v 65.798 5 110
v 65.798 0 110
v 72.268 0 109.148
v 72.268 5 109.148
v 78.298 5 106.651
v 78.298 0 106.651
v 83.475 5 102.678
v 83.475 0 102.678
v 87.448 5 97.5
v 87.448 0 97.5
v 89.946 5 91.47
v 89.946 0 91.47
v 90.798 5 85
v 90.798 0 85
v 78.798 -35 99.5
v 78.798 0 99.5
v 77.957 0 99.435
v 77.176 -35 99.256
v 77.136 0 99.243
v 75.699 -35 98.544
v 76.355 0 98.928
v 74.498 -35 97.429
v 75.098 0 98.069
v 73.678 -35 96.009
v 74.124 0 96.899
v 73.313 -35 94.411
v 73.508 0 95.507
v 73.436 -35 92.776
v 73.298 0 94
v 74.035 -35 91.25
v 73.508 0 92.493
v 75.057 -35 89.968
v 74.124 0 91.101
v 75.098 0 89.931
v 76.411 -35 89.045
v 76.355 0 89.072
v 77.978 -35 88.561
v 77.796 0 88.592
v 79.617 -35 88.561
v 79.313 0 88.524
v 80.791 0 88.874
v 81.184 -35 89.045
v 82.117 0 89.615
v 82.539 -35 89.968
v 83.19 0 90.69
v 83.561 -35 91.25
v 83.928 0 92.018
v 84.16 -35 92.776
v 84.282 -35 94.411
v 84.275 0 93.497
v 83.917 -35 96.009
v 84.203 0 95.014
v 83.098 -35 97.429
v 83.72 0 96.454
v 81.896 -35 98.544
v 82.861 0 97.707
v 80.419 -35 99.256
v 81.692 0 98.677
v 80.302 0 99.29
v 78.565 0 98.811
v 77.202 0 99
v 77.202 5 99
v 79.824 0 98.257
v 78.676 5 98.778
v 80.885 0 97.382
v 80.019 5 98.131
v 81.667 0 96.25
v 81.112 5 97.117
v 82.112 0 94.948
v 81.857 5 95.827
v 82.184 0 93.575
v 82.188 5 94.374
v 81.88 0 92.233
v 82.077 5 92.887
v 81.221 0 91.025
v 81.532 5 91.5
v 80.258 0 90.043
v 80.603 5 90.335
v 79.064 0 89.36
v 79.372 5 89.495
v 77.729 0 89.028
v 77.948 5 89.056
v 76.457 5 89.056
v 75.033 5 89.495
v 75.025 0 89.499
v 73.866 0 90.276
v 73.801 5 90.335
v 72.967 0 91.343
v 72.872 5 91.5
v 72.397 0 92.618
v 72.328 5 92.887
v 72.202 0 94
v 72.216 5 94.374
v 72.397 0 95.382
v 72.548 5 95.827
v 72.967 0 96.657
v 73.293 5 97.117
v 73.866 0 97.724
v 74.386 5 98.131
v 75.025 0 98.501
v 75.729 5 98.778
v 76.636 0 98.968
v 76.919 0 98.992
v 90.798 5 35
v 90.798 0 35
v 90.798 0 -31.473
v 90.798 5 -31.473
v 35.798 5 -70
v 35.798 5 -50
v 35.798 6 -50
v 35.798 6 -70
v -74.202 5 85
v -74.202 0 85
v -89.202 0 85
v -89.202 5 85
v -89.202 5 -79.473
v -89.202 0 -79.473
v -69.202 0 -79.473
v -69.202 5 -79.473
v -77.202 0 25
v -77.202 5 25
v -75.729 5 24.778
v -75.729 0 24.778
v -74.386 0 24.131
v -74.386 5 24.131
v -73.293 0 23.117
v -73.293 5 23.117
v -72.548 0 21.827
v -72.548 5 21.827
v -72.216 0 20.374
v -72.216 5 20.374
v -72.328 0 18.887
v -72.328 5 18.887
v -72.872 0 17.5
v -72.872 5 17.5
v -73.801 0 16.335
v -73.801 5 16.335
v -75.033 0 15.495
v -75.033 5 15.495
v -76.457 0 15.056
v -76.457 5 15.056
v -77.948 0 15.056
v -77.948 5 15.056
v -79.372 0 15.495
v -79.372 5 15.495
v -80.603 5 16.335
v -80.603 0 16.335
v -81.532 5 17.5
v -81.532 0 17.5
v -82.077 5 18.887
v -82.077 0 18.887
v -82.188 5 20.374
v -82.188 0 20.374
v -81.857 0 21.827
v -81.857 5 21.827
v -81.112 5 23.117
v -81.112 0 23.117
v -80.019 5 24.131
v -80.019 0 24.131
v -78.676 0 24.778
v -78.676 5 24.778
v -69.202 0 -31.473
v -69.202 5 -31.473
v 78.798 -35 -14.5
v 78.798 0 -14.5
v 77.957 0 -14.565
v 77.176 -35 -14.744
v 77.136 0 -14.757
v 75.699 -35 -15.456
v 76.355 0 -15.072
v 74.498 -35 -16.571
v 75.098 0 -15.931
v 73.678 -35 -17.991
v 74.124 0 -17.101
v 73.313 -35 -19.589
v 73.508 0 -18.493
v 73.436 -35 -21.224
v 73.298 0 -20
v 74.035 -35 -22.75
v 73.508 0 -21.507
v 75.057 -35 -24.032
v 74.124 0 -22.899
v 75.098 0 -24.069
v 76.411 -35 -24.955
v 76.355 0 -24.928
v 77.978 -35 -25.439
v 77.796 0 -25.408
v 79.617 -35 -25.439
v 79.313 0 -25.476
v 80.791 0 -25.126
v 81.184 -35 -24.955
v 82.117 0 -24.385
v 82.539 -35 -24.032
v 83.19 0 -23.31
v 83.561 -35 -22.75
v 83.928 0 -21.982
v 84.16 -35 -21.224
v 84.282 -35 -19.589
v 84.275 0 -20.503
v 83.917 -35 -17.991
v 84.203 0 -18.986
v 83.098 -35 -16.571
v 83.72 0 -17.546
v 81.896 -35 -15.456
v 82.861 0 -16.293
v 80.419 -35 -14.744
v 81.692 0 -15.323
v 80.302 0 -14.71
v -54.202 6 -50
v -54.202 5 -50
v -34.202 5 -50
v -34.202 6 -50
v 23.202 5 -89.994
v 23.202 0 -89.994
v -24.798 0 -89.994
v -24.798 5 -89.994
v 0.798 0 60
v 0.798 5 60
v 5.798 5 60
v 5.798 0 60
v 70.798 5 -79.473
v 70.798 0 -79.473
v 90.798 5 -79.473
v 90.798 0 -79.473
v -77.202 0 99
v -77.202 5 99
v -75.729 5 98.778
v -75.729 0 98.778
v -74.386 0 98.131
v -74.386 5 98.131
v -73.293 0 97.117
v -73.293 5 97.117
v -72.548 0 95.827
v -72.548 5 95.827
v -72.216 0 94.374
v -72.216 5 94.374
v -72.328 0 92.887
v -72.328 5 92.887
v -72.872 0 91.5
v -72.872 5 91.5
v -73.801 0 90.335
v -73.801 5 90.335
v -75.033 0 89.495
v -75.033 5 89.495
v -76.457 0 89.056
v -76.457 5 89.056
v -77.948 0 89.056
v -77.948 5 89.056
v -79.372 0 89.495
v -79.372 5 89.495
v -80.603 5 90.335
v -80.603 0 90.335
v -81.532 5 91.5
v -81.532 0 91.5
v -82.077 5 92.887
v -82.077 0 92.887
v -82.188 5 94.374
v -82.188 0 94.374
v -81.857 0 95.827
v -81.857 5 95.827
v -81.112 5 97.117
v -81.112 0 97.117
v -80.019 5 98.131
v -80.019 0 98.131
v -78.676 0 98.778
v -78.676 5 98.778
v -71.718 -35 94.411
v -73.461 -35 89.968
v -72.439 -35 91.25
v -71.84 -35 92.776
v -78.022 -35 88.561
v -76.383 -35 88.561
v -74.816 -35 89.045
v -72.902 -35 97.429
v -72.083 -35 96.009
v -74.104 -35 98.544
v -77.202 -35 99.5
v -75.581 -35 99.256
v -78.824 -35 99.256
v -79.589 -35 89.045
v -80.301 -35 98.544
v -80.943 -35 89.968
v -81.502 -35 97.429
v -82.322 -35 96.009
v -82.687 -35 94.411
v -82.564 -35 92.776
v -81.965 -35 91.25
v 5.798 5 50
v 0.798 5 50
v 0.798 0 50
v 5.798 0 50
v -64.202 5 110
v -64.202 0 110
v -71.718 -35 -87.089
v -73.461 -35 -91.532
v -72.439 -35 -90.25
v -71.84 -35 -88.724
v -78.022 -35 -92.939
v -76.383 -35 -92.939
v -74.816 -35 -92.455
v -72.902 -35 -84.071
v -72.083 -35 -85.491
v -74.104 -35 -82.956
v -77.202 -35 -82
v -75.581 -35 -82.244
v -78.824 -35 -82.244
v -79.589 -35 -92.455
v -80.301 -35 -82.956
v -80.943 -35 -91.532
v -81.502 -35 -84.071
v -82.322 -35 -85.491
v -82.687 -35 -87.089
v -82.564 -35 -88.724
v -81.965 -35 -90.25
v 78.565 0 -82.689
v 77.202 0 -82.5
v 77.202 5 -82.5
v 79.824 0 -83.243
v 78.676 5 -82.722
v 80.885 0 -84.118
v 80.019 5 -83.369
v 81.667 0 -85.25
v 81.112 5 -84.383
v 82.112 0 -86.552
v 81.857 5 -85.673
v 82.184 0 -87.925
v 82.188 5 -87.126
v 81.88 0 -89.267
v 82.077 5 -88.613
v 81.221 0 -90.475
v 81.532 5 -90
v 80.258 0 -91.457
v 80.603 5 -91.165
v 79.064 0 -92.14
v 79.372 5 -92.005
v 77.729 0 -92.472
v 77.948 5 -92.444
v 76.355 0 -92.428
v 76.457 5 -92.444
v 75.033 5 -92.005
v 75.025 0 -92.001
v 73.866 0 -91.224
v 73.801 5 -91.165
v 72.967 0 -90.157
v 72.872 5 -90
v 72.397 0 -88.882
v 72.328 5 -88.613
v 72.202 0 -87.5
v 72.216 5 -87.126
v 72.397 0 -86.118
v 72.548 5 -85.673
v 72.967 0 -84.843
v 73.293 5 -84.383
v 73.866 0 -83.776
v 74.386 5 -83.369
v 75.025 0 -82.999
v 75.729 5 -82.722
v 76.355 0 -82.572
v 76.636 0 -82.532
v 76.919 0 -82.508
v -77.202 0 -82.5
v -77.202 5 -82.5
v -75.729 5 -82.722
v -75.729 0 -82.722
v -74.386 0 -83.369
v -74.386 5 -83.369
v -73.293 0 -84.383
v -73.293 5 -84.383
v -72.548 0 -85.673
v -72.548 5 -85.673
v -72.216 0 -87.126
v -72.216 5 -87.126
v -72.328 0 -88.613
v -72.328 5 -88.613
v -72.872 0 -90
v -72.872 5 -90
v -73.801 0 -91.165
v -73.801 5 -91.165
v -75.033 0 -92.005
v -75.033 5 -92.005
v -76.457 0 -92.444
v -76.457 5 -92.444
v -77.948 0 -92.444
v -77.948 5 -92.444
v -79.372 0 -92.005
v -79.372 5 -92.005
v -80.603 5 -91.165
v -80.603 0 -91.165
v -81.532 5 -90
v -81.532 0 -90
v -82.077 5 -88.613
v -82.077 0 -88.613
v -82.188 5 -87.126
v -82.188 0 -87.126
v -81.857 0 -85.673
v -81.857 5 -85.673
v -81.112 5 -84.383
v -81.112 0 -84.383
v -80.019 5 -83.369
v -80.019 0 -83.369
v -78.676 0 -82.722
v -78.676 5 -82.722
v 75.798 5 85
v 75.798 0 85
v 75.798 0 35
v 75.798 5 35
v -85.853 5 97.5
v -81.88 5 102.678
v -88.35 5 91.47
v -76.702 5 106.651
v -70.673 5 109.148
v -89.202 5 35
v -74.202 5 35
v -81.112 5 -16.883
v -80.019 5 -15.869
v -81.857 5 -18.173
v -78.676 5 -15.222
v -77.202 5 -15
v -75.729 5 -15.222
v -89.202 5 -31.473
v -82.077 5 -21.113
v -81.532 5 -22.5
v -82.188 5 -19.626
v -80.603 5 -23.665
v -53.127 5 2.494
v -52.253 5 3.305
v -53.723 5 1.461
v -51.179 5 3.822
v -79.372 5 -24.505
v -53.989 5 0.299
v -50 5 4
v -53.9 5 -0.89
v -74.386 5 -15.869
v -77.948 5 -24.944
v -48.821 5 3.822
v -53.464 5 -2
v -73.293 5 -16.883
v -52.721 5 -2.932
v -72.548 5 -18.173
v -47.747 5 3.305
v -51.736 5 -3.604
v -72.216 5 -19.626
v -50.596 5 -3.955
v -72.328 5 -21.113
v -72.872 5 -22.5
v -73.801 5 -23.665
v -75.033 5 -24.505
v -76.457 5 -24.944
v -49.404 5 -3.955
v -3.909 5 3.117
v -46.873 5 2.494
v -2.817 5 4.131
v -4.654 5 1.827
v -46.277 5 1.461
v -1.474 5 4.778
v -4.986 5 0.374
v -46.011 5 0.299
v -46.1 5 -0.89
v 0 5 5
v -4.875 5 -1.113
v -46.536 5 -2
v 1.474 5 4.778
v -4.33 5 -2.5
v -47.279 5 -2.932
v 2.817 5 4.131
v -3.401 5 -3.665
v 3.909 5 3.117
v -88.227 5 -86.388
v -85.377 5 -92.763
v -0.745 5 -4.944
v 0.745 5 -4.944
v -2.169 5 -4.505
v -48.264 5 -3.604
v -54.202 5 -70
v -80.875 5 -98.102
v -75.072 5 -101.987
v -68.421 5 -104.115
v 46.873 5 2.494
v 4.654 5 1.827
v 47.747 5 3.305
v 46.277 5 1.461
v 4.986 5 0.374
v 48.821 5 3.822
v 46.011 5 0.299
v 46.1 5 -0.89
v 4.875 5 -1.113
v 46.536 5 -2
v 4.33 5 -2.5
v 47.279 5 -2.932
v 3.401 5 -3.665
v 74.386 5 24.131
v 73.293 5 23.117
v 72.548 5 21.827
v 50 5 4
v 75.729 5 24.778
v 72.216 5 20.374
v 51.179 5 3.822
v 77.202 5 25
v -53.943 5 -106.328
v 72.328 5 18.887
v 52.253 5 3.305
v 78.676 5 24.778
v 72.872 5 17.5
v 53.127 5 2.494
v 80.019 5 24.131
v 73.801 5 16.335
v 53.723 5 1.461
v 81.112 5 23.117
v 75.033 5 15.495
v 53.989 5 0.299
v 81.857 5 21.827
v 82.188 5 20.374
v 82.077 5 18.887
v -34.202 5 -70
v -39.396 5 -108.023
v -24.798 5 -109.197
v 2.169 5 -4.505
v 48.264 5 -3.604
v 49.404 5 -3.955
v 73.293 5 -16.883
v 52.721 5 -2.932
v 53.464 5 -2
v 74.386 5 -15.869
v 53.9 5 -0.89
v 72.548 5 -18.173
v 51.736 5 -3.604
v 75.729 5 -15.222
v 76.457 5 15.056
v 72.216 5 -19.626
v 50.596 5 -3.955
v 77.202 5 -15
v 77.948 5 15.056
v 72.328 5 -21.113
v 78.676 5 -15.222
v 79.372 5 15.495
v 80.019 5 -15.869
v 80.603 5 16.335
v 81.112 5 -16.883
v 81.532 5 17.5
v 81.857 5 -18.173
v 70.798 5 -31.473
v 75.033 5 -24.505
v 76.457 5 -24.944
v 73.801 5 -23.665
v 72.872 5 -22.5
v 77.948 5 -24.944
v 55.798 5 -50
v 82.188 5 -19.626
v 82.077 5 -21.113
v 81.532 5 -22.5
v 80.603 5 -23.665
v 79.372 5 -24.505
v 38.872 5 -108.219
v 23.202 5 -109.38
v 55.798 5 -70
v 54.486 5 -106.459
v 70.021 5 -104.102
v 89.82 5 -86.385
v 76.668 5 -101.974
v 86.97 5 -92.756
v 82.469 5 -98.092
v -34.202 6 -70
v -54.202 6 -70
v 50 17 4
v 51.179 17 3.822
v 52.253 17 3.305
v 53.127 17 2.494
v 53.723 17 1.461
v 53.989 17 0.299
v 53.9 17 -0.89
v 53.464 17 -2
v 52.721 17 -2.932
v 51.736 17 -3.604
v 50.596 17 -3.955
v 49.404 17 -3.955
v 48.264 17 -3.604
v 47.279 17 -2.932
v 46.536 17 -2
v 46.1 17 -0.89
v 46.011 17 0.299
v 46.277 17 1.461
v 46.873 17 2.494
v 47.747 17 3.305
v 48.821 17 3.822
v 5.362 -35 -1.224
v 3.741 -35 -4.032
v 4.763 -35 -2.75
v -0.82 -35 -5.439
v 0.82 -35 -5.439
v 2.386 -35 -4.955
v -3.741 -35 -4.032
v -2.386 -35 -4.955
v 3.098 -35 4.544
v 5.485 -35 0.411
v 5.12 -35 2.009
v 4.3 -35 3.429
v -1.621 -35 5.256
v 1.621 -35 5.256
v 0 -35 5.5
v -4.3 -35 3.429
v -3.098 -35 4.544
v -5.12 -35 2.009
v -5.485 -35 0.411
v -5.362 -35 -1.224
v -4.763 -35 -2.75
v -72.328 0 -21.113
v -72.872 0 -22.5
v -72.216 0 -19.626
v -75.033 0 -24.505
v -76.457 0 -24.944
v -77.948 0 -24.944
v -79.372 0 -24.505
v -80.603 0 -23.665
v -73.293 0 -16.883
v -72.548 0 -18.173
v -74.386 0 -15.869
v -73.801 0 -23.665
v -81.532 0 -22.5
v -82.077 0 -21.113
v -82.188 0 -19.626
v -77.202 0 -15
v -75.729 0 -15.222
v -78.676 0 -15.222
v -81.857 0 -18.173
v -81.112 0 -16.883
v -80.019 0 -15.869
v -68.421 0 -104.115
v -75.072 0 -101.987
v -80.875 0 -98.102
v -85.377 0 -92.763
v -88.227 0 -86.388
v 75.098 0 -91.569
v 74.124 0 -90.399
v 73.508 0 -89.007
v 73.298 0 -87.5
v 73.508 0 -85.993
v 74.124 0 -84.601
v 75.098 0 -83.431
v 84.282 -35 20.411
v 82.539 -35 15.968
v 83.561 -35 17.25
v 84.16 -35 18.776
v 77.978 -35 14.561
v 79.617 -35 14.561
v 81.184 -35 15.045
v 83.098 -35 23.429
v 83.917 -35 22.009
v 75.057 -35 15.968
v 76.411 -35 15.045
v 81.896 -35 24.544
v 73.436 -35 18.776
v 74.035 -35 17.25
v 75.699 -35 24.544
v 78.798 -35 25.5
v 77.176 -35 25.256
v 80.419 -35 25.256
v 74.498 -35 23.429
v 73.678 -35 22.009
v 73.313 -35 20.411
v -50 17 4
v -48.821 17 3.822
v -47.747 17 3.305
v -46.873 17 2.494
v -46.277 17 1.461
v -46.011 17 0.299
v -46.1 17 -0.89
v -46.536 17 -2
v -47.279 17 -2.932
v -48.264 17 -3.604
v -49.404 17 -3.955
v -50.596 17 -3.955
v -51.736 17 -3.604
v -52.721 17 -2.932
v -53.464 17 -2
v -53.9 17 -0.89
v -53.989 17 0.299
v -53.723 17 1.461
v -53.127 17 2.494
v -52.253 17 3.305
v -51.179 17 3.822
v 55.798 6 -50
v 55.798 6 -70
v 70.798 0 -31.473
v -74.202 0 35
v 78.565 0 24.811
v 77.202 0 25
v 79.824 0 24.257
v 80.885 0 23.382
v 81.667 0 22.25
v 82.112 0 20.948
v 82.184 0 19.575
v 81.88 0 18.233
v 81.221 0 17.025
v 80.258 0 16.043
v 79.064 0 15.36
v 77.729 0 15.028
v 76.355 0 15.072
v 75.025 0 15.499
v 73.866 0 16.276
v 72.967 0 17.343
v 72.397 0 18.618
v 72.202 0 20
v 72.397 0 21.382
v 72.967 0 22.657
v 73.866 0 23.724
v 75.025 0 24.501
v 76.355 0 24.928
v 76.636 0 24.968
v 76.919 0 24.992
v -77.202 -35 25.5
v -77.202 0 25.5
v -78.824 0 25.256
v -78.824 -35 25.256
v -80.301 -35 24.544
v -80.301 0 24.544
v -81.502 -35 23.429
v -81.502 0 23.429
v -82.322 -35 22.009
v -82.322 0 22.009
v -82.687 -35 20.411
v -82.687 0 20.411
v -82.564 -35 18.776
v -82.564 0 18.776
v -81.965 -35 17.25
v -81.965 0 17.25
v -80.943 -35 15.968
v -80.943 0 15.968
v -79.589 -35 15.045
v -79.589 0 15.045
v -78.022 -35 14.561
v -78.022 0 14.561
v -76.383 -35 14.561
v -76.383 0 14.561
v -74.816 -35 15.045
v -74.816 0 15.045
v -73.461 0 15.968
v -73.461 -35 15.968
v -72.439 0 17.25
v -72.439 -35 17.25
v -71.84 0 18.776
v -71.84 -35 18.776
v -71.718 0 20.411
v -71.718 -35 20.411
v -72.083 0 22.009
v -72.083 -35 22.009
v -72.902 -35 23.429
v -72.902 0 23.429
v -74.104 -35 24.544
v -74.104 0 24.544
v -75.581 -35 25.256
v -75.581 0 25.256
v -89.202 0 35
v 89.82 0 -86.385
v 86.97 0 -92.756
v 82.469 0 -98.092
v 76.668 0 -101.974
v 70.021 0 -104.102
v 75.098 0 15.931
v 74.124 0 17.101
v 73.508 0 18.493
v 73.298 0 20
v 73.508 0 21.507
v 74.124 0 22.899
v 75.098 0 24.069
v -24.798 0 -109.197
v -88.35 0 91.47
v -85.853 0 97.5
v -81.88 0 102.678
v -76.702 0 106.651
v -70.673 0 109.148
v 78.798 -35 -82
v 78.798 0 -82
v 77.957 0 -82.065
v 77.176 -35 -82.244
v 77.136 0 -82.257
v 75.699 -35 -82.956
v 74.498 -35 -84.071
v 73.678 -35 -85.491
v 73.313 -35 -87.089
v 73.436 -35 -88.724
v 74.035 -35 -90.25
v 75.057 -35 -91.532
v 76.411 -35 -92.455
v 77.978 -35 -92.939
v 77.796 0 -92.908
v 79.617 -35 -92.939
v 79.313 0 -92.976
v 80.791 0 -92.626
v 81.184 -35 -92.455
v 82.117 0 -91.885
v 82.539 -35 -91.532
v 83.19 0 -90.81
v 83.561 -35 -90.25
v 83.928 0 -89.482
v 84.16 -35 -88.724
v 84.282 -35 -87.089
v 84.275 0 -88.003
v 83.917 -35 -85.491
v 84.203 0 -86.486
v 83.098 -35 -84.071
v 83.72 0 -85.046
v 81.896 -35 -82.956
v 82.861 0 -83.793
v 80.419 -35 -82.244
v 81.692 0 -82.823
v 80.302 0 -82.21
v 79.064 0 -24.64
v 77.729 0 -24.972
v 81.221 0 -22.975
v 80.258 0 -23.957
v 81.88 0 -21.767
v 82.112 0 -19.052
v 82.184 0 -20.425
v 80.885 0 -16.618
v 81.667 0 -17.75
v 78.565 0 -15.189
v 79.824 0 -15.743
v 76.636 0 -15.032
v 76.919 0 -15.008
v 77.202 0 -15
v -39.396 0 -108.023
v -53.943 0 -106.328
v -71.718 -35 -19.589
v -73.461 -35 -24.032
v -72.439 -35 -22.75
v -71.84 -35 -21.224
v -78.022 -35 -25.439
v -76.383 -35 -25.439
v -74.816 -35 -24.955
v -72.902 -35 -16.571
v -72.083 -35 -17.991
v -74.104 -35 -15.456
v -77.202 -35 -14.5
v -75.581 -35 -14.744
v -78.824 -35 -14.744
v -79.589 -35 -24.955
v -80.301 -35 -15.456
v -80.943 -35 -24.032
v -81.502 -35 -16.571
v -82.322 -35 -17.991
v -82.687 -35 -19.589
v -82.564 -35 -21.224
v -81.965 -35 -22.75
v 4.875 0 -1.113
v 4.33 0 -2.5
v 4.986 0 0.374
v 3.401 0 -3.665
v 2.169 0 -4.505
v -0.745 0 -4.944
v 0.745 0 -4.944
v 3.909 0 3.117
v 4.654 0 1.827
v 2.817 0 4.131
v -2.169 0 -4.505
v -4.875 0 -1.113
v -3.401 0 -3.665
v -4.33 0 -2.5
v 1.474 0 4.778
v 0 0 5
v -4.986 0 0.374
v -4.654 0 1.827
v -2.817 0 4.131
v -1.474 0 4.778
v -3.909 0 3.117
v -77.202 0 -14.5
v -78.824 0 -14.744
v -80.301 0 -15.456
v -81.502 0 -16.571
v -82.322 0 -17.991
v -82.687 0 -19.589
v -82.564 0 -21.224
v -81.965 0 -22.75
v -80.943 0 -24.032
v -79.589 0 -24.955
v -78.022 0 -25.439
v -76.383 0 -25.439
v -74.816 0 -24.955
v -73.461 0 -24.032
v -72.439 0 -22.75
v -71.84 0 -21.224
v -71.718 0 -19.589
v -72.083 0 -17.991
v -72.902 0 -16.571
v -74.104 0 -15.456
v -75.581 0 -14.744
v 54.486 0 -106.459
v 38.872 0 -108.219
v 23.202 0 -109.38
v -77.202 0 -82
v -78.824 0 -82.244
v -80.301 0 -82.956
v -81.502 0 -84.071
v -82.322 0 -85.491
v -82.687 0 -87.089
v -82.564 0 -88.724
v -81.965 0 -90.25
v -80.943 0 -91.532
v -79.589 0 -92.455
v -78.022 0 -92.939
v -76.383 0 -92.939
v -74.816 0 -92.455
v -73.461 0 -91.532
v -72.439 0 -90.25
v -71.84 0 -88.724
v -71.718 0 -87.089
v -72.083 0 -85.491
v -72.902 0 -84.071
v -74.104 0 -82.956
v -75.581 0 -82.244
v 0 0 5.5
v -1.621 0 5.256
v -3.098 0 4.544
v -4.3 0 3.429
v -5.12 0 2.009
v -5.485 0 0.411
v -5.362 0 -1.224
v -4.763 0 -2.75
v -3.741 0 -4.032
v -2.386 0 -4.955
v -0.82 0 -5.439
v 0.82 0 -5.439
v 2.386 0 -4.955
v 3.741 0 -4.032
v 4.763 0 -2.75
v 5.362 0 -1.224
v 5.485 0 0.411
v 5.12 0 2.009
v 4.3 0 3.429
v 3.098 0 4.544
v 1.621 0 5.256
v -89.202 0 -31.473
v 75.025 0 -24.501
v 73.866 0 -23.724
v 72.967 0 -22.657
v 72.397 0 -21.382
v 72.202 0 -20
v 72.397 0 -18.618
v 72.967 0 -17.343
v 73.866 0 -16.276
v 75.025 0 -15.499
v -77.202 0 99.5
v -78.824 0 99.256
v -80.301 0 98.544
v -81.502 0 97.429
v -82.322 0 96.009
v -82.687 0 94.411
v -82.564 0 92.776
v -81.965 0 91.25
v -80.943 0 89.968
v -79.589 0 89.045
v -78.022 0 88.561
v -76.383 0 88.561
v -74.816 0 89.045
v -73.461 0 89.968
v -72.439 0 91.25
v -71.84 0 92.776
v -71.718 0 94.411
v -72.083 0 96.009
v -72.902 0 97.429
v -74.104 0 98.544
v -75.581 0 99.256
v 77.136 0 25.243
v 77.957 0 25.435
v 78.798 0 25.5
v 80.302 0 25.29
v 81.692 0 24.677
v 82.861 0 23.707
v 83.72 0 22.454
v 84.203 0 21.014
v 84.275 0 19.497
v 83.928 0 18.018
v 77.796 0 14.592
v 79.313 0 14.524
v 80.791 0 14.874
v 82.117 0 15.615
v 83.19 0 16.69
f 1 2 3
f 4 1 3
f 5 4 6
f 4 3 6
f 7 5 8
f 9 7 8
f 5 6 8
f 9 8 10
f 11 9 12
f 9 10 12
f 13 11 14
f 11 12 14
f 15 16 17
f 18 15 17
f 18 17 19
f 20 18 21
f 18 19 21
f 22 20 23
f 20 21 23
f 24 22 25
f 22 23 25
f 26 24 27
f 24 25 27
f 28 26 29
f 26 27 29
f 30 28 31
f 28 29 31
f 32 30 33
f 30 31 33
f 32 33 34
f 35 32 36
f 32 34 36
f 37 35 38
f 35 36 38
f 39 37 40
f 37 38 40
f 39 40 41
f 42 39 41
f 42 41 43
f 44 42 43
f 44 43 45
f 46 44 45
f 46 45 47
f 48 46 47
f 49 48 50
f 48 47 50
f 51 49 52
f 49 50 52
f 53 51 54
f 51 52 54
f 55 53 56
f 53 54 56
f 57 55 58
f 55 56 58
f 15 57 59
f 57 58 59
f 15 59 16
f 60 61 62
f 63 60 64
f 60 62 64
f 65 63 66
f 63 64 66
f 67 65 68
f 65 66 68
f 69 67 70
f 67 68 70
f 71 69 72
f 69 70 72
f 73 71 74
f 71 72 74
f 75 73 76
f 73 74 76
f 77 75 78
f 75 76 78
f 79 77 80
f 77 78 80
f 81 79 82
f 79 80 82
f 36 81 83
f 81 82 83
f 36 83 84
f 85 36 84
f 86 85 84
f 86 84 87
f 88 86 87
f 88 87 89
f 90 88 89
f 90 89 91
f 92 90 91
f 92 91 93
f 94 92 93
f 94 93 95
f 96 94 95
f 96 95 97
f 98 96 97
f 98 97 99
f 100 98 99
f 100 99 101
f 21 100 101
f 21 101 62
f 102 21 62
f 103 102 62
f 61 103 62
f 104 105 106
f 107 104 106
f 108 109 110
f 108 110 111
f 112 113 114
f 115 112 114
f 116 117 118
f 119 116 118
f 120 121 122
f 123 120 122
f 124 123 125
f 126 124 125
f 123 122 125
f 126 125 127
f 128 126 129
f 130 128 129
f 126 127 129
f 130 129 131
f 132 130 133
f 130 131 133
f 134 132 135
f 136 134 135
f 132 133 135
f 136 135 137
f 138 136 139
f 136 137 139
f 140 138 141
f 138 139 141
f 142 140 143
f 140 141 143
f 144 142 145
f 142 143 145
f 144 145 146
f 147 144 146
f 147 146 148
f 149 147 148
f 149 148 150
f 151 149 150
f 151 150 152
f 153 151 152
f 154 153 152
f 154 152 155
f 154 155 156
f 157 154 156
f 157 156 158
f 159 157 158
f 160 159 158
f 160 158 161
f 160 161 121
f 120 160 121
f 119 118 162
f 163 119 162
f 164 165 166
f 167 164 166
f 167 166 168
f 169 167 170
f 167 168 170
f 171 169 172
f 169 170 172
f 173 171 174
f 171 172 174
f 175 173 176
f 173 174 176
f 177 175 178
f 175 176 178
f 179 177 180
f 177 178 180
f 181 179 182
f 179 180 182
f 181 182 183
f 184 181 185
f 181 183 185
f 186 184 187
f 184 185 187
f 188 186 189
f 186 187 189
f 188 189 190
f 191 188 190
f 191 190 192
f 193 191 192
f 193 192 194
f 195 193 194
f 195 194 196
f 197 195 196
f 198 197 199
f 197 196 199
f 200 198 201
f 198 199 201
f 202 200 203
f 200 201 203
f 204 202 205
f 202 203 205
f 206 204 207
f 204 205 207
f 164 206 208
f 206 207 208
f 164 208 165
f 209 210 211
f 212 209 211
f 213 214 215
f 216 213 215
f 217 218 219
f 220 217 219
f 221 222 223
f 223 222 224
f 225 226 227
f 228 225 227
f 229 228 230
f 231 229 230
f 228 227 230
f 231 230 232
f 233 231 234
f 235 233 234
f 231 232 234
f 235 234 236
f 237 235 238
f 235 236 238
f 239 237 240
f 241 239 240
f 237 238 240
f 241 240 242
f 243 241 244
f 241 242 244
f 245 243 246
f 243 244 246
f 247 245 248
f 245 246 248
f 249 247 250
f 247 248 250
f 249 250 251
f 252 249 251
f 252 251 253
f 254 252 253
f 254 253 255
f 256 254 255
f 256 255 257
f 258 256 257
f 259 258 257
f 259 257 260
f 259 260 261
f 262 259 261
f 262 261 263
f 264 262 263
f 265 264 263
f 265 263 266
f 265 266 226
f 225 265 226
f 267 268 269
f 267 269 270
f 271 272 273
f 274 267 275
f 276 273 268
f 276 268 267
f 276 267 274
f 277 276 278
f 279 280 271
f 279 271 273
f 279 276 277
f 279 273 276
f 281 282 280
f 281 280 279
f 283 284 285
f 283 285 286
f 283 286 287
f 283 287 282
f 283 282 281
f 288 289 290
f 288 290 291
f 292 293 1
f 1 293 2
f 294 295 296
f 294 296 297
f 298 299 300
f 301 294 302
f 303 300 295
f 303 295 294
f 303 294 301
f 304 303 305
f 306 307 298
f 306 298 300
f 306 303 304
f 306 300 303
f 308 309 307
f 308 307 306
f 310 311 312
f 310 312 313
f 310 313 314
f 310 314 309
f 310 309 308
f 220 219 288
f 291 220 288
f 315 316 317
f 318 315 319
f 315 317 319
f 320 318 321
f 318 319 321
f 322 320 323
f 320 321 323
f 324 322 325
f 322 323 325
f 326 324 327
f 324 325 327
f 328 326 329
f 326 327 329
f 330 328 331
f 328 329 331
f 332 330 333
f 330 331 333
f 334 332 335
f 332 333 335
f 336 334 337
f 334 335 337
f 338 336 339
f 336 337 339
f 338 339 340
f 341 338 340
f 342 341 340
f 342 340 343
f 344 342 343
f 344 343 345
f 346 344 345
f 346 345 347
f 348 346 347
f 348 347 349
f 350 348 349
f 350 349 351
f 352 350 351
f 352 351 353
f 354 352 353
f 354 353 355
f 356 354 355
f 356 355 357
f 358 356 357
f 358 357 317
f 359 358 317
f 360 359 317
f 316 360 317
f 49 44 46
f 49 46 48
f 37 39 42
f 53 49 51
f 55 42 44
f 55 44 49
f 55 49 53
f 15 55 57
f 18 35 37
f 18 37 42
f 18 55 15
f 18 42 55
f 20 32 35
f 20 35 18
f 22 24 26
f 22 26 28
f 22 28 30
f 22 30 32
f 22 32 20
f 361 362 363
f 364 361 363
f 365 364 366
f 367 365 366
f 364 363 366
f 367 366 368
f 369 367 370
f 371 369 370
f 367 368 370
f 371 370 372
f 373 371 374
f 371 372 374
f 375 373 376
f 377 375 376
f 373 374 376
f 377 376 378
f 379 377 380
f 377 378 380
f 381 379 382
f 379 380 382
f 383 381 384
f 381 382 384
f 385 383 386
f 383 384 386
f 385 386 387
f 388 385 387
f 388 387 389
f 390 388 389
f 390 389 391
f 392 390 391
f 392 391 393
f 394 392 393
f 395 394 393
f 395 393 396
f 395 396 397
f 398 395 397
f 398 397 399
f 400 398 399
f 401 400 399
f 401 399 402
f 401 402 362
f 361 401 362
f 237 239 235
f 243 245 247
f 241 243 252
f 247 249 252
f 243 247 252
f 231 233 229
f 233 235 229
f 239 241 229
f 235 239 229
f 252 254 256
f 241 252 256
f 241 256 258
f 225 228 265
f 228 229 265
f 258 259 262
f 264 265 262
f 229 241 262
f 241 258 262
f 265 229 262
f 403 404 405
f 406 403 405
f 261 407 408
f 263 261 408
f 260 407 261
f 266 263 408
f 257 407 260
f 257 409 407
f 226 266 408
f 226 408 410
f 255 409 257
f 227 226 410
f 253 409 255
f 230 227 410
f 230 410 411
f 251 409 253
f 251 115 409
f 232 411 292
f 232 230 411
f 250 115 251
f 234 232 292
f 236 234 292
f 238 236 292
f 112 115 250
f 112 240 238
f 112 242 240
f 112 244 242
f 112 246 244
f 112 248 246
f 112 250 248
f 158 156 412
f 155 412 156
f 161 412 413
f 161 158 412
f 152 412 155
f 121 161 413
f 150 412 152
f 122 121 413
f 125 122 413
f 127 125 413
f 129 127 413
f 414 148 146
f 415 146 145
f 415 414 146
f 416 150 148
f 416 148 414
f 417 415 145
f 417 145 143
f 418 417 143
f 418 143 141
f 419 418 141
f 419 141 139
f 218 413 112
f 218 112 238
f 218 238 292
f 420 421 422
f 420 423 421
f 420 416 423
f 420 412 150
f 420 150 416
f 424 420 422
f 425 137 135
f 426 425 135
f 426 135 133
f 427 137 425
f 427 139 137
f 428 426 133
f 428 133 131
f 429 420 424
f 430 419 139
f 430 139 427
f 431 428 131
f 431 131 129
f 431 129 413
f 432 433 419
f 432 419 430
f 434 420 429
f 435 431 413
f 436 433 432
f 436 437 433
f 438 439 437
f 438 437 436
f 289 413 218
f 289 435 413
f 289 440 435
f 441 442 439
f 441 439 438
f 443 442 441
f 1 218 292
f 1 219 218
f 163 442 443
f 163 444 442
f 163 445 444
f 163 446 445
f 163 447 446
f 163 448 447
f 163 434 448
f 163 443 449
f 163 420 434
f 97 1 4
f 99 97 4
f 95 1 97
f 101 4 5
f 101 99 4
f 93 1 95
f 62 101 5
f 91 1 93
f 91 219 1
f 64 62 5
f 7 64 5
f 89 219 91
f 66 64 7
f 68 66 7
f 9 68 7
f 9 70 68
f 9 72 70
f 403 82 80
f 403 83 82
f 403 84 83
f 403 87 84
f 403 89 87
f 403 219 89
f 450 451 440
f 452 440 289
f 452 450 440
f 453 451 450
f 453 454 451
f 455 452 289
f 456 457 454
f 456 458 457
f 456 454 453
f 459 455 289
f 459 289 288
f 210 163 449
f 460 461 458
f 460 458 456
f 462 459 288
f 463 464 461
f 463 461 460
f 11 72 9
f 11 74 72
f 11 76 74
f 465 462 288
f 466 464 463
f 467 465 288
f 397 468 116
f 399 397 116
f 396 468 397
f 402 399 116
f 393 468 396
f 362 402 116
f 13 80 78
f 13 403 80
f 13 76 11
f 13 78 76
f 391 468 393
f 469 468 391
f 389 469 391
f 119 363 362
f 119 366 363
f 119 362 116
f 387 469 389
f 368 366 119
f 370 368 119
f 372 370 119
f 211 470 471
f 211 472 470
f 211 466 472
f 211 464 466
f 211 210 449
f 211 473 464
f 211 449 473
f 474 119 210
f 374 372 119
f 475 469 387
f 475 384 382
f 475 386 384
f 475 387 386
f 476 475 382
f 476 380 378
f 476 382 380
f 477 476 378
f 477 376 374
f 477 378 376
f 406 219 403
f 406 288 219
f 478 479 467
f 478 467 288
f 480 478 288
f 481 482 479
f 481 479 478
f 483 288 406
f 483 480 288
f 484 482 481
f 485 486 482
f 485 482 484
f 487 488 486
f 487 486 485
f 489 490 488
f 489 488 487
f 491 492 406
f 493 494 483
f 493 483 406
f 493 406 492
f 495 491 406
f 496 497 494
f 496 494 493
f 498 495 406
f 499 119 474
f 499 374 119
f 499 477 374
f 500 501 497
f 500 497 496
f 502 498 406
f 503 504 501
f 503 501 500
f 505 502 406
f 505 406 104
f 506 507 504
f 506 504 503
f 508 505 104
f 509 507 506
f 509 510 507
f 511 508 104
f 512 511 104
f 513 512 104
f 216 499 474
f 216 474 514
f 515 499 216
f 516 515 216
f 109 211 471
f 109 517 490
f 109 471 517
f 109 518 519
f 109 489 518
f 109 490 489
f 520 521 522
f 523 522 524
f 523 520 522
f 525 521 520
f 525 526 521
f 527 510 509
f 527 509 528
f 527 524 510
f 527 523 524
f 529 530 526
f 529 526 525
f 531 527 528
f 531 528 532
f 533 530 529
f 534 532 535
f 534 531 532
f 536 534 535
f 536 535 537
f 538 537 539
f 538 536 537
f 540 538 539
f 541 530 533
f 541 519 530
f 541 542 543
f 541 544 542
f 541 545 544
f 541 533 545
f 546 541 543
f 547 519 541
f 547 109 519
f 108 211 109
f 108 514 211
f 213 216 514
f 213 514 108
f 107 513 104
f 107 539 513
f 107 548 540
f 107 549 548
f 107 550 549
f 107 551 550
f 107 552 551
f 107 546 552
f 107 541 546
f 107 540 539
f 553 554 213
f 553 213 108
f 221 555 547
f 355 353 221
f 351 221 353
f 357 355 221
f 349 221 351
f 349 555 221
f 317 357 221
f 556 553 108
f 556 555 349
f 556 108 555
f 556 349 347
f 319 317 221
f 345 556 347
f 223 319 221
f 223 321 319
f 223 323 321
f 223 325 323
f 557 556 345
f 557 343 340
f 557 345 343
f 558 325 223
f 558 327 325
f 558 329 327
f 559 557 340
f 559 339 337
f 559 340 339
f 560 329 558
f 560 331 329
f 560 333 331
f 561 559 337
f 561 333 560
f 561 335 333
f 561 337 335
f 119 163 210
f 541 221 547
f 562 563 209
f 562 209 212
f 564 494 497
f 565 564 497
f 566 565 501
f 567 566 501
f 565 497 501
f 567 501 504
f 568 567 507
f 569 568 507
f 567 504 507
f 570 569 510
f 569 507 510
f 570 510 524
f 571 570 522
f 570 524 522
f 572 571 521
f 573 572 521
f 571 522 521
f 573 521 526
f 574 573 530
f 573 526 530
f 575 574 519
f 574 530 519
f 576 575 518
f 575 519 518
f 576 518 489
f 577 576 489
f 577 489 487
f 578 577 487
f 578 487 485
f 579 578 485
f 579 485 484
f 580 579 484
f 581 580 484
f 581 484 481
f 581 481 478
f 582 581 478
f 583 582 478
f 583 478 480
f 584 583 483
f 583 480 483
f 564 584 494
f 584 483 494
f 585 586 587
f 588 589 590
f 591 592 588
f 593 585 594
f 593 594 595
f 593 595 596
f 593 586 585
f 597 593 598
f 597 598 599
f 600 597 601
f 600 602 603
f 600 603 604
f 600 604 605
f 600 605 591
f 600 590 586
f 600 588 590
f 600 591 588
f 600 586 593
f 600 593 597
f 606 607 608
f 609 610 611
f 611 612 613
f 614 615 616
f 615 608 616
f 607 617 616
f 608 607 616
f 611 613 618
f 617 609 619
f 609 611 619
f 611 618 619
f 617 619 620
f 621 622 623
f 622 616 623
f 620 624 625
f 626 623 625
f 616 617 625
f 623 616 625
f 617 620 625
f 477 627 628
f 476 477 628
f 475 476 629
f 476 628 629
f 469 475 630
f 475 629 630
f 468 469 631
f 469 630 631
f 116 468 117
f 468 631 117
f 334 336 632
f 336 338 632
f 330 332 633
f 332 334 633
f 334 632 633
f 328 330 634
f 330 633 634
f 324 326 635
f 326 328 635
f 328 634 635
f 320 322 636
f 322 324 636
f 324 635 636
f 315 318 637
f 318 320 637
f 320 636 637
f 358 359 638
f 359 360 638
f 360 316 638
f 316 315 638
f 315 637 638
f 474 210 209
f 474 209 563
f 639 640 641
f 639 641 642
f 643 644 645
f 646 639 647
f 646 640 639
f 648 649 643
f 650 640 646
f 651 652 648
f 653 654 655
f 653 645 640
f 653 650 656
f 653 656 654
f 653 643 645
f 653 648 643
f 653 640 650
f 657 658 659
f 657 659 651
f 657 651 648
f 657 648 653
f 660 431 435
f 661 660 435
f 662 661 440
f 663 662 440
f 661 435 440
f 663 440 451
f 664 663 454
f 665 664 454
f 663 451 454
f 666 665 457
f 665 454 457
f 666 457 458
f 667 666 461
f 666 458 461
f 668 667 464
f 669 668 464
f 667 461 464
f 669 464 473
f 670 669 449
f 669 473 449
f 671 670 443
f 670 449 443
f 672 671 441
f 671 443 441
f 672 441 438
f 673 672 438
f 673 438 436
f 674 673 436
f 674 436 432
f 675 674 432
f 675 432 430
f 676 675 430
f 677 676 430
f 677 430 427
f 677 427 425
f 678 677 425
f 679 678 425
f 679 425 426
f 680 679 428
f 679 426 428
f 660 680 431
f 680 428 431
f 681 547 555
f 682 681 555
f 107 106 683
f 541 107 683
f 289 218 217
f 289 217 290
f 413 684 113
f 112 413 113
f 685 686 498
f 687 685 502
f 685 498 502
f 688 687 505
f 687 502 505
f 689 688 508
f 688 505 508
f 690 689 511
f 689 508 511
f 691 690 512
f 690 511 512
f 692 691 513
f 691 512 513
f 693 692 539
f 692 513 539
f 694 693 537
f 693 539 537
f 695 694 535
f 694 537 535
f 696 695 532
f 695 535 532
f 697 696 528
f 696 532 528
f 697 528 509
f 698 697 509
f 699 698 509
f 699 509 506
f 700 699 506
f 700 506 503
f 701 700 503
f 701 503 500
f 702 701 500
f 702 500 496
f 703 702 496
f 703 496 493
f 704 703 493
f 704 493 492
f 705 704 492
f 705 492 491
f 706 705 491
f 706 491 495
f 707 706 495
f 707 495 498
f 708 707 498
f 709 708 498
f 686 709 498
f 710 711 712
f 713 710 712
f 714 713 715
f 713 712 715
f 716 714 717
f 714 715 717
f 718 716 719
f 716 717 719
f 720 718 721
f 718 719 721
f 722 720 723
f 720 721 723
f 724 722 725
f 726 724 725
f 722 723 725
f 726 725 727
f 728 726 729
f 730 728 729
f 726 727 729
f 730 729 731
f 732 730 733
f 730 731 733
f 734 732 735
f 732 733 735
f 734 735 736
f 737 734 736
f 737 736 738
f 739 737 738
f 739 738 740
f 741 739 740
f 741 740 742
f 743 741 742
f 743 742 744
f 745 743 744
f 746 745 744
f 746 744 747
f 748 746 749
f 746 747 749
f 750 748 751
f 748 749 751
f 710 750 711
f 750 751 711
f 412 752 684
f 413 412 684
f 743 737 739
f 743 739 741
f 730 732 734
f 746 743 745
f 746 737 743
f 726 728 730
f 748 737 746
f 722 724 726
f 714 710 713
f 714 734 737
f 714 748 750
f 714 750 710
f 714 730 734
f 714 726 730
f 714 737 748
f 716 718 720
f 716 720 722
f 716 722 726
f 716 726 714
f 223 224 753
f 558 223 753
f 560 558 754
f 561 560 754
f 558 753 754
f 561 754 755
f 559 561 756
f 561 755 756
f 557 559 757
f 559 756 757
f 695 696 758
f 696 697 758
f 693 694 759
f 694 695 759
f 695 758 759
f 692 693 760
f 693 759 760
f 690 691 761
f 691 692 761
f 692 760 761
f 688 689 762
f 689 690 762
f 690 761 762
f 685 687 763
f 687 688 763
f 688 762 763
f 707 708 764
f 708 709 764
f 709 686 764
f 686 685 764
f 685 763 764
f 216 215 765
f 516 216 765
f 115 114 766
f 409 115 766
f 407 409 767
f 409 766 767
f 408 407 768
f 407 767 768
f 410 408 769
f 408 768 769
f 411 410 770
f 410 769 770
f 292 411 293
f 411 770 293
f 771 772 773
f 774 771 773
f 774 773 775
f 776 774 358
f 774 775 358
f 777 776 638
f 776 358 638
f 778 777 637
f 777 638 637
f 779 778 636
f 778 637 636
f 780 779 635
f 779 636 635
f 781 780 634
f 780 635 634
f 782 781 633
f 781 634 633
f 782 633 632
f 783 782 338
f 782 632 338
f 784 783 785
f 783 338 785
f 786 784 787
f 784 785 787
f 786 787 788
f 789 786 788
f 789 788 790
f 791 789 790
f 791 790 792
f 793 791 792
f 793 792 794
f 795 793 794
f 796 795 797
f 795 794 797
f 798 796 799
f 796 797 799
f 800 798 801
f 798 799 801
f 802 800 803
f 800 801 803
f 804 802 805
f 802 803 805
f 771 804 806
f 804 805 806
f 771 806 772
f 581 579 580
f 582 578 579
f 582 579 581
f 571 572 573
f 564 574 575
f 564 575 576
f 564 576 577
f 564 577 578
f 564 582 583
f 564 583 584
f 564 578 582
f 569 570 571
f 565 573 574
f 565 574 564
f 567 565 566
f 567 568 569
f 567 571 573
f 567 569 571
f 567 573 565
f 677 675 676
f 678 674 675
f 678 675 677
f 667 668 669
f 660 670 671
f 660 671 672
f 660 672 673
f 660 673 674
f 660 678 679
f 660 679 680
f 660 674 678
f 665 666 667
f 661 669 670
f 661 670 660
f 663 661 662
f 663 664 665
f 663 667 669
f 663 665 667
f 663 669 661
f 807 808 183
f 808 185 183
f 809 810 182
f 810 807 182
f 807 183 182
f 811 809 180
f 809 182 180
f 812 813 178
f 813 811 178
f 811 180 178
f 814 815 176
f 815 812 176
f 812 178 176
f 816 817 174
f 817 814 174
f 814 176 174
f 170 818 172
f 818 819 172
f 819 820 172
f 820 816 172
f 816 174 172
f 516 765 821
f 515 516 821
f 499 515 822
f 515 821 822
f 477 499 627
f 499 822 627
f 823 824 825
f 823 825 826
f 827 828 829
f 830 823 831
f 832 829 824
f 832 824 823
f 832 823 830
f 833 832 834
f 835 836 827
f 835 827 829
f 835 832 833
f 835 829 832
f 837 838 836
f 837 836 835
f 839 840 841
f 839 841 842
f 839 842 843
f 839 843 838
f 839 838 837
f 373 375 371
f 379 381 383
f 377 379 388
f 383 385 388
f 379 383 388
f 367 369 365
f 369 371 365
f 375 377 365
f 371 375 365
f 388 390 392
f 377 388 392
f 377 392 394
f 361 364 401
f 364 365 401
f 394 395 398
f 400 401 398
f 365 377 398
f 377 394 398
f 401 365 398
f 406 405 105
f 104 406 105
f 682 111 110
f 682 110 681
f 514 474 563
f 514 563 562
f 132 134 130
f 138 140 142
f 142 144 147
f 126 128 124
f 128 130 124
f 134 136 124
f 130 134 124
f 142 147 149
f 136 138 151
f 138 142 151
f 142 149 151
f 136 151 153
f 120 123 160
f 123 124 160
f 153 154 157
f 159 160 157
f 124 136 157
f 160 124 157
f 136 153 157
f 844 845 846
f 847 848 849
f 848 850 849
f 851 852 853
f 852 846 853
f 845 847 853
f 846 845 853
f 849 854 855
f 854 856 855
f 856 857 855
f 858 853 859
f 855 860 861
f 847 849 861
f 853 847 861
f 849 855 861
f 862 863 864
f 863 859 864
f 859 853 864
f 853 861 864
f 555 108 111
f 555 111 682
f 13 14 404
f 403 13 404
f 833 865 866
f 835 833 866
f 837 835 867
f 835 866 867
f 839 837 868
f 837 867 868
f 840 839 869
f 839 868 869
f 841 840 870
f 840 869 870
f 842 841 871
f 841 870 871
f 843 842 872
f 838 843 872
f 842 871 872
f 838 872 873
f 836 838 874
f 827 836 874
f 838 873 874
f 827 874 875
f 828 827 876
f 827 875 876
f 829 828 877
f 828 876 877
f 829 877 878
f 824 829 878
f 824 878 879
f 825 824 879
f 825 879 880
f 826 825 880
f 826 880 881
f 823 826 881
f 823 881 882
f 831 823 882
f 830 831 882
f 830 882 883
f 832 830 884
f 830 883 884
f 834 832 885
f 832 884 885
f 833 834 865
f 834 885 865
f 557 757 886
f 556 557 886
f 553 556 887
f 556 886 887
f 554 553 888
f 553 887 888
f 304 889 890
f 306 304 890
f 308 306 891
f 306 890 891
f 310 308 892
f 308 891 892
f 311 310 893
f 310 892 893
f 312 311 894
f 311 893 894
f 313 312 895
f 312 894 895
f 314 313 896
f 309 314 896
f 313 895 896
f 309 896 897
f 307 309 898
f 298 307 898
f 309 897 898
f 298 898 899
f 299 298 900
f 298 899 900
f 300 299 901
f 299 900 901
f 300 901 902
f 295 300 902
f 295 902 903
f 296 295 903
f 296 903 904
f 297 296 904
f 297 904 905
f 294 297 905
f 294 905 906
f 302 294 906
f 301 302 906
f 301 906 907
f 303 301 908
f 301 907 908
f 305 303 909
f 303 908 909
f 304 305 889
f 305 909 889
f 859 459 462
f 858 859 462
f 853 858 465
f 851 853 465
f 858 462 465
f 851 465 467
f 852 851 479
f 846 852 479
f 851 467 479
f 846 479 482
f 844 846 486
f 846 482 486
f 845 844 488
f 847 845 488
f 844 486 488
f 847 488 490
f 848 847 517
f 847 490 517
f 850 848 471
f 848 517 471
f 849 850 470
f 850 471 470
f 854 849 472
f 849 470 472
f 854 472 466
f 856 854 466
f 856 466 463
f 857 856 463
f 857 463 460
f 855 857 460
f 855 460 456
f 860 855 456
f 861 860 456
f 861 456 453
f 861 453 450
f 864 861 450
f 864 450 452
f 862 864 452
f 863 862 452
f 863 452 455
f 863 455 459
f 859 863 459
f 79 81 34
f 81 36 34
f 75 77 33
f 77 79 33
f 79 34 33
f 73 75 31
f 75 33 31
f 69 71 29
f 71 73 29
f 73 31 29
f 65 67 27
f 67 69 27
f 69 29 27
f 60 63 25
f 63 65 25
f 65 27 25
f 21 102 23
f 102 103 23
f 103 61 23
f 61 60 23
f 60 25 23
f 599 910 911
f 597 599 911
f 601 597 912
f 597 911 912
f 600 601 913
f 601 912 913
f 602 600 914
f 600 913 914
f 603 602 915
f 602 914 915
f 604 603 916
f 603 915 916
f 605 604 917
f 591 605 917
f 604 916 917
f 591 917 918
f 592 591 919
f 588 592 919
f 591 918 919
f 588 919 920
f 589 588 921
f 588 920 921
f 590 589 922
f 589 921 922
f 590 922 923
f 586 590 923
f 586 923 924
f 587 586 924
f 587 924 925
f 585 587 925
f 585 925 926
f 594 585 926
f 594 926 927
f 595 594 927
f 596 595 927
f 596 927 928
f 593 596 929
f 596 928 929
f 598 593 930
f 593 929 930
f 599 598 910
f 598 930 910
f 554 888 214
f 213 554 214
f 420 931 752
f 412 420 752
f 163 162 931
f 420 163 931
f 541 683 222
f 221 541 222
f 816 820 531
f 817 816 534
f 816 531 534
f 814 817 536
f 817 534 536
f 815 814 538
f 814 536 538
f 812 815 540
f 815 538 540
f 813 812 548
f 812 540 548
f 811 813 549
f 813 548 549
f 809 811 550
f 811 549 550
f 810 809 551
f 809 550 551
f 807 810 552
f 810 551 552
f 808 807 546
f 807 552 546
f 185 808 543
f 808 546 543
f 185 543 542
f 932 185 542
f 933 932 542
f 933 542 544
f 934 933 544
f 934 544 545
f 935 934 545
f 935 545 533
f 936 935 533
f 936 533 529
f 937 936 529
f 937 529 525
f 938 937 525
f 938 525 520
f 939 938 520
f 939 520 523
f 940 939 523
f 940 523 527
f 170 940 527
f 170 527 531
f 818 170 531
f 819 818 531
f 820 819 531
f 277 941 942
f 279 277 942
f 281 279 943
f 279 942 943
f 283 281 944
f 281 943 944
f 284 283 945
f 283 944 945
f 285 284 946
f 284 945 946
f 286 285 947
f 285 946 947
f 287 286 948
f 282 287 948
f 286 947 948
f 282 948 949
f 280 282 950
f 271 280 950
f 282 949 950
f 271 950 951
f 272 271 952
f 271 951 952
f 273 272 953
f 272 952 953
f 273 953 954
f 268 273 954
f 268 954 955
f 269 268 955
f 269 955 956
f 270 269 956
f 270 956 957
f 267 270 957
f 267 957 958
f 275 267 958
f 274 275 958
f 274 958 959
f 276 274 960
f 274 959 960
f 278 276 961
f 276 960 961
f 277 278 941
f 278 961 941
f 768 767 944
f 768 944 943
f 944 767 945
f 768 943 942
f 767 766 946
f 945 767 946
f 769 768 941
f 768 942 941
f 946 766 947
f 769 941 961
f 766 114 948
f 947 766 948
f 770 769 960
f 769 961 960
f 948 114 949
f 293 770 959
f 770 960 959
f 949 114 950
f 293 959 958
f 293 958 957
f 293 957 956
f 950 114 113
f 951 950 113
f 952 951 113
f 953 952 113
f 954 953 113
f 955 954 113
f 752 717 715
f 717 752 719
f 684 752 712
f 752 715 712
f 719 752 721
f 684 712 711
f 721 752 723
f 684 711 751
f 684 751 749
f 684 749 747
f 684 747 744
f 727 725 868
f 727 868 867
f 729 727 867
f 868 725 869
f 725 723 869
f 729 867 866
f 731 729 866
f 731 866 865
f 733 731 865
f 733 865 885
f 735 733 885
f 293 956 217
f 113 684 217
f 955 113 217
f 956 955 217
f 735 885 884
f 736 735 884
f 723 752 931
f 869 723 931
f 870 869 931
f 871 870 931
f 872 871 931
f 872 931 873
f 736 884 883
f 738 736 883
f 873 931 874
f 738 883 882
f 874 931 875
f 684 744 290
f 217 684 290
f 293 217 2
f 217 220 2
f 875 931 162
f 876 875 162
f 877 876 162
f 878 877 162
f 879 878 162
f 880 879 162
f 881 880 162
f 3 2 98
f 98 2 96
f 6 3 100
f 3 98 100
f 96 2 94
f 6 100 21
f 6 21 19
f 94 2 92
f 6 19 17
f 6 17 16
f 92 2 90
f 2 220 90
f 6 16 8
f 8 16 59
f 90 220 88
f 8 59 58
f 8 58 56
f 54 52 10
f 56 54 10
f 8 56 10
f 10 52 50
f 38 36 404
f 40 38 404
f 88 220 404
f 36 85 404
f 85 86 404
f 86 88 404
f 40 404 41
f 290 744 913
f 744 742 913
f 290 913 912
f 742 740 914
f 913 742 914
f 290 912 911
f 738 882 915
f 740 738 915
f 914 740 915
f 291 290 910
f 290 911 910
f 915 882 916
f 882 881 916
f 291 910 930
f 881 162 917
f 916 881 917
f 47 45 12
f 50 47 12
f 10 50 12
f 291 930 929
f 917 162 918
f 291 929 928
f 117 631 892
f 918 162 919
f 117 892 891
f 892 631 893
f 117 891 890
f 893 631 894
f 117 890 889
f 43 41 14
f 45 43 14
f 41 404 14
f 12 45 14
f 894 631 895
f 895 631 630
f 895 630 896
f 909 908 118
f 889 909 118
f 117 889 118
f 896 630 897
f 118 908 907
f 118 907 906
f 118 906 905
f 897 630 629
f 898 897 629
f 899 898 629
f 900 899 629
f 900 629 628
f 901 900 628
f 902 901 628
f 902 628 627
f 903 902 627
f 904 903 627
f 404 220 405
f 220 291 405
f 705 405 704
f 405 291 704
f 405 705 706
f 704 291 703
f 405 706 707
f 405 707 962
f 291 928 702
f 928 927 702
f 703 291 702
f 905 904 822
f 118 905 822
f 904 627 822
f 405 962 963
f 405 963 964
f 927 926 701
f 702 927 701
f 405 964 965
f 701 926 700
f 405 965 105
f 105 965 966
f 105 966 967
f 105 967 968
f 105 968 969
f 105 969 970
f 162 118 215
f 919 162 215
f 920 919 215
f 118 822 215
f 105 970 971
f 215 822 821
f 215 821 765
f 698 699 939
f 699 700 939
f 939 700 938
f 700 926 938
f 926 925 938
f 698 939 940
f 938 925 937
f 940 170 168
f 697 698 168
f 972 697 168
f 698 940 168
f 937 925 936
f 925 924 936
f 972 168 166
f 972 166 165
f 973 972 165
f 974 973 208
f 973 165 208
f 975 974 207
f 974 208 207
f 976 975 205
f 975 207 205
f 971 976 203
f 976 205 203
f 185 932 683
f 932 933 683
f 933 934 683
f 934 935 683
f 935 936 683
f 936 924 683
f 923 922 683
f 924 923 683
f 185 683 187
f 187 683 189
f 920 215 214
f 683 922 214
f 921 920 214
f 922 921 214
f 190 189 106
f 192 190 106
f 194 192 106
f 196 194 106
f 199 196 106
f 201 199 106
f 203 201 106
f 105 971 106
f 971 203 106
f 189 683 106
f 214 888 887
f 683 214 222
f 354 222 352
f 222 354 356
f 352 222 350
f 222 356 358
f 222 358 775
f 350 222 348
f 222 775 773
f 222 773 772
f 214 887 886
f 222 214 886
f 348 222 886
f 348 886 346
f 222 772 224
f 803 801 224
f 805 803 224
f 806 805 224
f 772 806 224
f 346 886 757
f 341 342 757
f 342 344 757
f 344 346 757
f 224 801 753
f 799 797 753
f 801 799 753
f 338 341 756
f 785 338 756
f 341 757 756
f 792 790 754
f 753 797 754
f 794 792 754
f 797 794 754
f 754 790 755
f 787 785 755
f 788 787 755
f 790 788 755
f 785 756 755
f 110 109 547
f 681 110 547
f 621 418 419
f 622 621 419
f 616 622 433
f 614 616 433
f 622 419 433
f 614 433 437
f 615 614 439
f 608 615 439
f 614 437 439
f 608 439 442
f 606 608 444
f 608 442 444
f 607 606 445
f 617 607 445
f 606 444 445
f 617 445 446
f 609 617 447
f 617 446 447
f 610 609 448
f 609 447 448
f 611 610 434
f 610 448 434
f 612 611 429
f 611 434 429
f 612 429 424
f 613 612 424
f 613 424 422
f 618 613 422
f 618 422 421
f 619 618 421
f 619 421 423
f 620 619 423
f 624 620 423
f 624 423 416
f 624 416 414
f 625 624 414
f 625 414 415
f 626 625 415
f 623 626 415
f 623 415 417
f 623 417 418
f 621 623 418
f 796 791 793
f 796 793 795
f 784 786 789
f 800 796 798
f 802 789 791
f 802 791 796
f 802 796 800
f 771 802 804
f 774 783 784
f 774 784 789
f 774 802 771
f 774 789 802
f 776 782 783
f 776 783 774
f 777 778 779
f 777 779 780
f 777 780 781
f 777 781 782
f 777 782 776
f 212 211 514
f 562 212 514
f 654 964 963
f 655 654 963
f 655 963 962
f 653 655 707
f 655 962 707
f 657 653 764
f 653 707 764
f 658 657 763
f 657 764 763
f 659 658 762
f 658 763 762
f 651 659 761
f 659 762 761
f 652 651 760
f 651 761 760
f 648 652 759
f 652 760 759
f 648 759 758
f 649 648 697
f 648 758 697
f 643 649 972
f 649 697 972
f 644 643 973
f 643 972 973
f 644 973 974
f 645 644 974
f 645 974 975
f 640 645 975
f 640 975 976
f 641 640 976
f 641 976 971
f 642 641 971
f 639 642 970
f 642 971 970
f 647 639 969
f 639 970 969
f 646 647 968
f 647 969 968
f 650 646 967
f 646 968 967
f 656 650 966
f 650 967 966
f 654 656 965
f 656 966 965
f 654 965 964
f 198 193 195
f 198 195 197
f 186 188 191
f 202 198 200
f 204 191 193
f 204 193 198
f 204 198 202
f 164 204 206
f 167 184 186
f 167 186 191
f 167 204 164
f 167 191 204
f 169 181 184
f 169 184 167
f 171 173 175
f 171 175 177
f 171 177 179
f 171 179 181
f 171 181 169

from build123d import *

# Parameters (mm, degrees)
BOSS_EXTRUDE1_DEPTH = 5
SKETCH2_W           = 5
SKETCH2_H           = 10
CUT_EXTRUDE1_DEPTH  = 5
SKETCH3_W           = 20
SKETCH3_H           = 20
BOSS_EXTRUDE2_DEPTH = 1
SKETCH5_R           = 5
CUT_EXTRUDE2_DEPTH  = 10
SKETCH6_R           = 5.5
BOSS_EXTRUDE3_DEPTH = 35
SKETCH7_R           = 4
BOSS_EXTRUDE4_DEPTH = 12


# Read off the part's stored shape, not the designer's step: Boss-Extrude1
with BuildPart() as part:
    # Boss-Extrude1 outline → Boss-Extrude1 (new body)
    with BuildSketch(Plane(origin=(0, 0, 0), x_dir=(1, 0, 0), z_dir=(0, 1, 0))):
        with BuildLine():
            ThreePointArc((-68.420925207, 104.11482166), (-83.313400439, 95.590634086), (-89.202352286, 79.47331922))
            Line((-89.202352286, 79.47331922), (-69.202352286, 79.47331922))
            Line((-69.202352286, 79.47331922), (-69.202352286, 31.47331922))
            Line((-69.202352286, 31.47331922), (-89.202352286, 31.47331922))
            Line((-89.202352286, 31.47331922), (-89.202352286, -35))
            Line((-89.202352286, -35), (-74.202352286, -35))
            Line((-74.202352286, -35), (-74.202352286, -85))
            Line((-74.202352286, -85), (-89.202352286, -85))
            ThreePointArc((-89.202352286, -85), (-81.880021816, -102.67766953), (-64.202352286, -110))
            Line((-64.202352286, -110), (65.797647714, -110))
            ThreePointArc((65.797647714, -110), (83.475317244, -102.67766953), (90.797647714, -85))
            Line((90.797647714, -85), (75.797647714, -85))
            Line((75.797647714, -85), (75.797647714, -35))
            Line((75.797647714, -35), (90.797647714, -35))
            Line((90.797647714, -35), (90.797647714, 31.47331922))
            Line((90.797647714, 31.47331922), (70.797647714, 31.47331922))
            Line((70.797647714, 31.47331922), (70.797647714, 79.47331922))
            Line((70.797647714, 79.47331922), (90.797645004, 79.473319219))
            ThreePointArc((90.797645004, 79.473319219), (84.90638671, 95.581731914), (70.020633234, 104.102425978))
            ThreePointArc((70.020633234, 104.102425978), (46.687380596, 107.414128219), (23.202394477, 109.379701262))
            Line((23.202394477, 109.379701262), (23.202394477, 89.994181642))
            Line((23.202394477, 89.994181642), (-24.797605523, 89.994181642))
            Line((-24.797605523, 89.994181642), (-24.797605523, 109.196602404))
            ThreePointArc((-24.797605523, 109.196602404), (-46.677357907, 107.240236017), (-68.420925207, 104.11482166))
        make_face()
    extrude(amount=BOSS_EXTRUDE1_DEPTH)

    # Sketch2 → Cut-Extrude1 (cut)
    with BuildSketch(Plane(origin=(0, 5, 0), x_dir=(1, 0, 0), z_dir=(0, 1, 0))):
        with Locations((3.297647714, -55)):
            Rectangle(SKETCH2_W, SKETCH2_H)
    extrude(amount=-CUT_EXTRUDE1_DEPTH, mode=Mode.SUBTRACT)

    # Sketch3 → Boss-Extrude2 (add)
    with BuildSketch(Plane(origin=(0, 5, 0), x_dir=(1, 0, 0), z_dir=(0, 1, 0))):
        with Locations((45.797647714, 60)):
            Rectangle(SKETCH3_W, SKETCH3_H)
        with Locations((-44.202352286, 60)):
            Rectangle(SKETCH3_W, SKETCH3_H)
    extrude(amount=BOSS_EXTRUDE2_DEPTH)

    # Sketch5 → Cut-Extrude2 (cut)
    with BuildSketch(Plane(origin=(0, 5, 0), x_dir=(1, 0, 0), z_dir=(0, 1, 0))):
        with Locations(Location((-77.202352286, 20, 0), (0, 0, 270))):
            Circle(SKETCH5_R)
        with Locations(Location((-77.202352286, -20, 0), (0, 0, 270))):
            Circle(SKETCH5_R)
        with Locations(Location((-77.202352286, 87.5, 0), (0, 0, 270))):
            Circle(SKETCH5_R)
        with Locations(Location((-77.202352286, -94, 0), (0, 0, 270))):
            Circle(SKETCH5_R)
        with Locations(Location((0, 0, 0), (0, 0, 270))):
            Circle(SKETCH5_R)
        with Locations(Location((77.202352286, -94, 0), (0, 0, 270))):
            Circle(SKETCH5_R)
        with Locations(Location((77.202352286, -20, 0), (0, 0, 270))):
            Circle(SKETCH5_R)
        with Locations(Location((77.202352286, 20, 0), (0, 0, 270))):
            Circle(SKETCH5_R)
        with Locations(Location((77.202352286, 87.5, 0), (0, 0, 270))):
            Circle(SKETCH5_R)
    extrude(amount=-CUT_EXTRUDE2_DEPTH, mode=Mode.SUBTRACT)

    # Sketch6 → Boss-Extrude3 (add)
    with BuildSketch(Plane.XZ):
        with Locations(Location((-77.202352286, 94, 0), (0, 0, 90))):
            Circle(SKETCH6_R)
        with Locations(Location((-77.202352286, 20, 0), (0, 0, 90))):
            Circle(SKETCH6_R)
        with Locations(Location((-77.202352286, -20, 0), (0, 0, 90))):
            Circle(SKETCH6_R)
        with Locations(Location((-77.202352286, -87.5, 0), (0, 0, 90))):
            Circle(SKETCH6_R)
        with Locations(Location((0, 0, 0), (0, 0, 90))):
            Circle(SKETCH6_R)
        with Locations(Location((78.797647714, -87.5, 0), (0, 0, 90))):
            Circle(SKETCH6_R)
        with Locations(Location((78.797647714, -20, 0), (0, 0, 90))):
            Circle(SKETCH6_R)
        with Locations(Location((78.797647714, 20, 0), (0, 0, 90))):
            Circle(SKETCH6_R)
        with Locations(Location((78.797647714, 94, 0), (0, 0, 90))):
            Circle(SKETCH6_R)
    extrude(amount=BOSS_EXTRUDE3_DEPTH)

    # Sketch7 → Boss-Extrude4 (add)
    with BuildSketch(Plane(origin=(0, 5, 0), x_dir=(1, 0, 0), z_dir=(0, 1, 0))):
        with Locations(Location((-50, 0, 0), (0, 0, 270))):
            Circle(SKETCH7_R)
        with Locations(Location((50, 0, 0), (0, 0, 270))):
            Circle(SKETCH7_R)
    extrude(amount=BOSS_EXTRUDE4_DEPTH)


solid = part.part
